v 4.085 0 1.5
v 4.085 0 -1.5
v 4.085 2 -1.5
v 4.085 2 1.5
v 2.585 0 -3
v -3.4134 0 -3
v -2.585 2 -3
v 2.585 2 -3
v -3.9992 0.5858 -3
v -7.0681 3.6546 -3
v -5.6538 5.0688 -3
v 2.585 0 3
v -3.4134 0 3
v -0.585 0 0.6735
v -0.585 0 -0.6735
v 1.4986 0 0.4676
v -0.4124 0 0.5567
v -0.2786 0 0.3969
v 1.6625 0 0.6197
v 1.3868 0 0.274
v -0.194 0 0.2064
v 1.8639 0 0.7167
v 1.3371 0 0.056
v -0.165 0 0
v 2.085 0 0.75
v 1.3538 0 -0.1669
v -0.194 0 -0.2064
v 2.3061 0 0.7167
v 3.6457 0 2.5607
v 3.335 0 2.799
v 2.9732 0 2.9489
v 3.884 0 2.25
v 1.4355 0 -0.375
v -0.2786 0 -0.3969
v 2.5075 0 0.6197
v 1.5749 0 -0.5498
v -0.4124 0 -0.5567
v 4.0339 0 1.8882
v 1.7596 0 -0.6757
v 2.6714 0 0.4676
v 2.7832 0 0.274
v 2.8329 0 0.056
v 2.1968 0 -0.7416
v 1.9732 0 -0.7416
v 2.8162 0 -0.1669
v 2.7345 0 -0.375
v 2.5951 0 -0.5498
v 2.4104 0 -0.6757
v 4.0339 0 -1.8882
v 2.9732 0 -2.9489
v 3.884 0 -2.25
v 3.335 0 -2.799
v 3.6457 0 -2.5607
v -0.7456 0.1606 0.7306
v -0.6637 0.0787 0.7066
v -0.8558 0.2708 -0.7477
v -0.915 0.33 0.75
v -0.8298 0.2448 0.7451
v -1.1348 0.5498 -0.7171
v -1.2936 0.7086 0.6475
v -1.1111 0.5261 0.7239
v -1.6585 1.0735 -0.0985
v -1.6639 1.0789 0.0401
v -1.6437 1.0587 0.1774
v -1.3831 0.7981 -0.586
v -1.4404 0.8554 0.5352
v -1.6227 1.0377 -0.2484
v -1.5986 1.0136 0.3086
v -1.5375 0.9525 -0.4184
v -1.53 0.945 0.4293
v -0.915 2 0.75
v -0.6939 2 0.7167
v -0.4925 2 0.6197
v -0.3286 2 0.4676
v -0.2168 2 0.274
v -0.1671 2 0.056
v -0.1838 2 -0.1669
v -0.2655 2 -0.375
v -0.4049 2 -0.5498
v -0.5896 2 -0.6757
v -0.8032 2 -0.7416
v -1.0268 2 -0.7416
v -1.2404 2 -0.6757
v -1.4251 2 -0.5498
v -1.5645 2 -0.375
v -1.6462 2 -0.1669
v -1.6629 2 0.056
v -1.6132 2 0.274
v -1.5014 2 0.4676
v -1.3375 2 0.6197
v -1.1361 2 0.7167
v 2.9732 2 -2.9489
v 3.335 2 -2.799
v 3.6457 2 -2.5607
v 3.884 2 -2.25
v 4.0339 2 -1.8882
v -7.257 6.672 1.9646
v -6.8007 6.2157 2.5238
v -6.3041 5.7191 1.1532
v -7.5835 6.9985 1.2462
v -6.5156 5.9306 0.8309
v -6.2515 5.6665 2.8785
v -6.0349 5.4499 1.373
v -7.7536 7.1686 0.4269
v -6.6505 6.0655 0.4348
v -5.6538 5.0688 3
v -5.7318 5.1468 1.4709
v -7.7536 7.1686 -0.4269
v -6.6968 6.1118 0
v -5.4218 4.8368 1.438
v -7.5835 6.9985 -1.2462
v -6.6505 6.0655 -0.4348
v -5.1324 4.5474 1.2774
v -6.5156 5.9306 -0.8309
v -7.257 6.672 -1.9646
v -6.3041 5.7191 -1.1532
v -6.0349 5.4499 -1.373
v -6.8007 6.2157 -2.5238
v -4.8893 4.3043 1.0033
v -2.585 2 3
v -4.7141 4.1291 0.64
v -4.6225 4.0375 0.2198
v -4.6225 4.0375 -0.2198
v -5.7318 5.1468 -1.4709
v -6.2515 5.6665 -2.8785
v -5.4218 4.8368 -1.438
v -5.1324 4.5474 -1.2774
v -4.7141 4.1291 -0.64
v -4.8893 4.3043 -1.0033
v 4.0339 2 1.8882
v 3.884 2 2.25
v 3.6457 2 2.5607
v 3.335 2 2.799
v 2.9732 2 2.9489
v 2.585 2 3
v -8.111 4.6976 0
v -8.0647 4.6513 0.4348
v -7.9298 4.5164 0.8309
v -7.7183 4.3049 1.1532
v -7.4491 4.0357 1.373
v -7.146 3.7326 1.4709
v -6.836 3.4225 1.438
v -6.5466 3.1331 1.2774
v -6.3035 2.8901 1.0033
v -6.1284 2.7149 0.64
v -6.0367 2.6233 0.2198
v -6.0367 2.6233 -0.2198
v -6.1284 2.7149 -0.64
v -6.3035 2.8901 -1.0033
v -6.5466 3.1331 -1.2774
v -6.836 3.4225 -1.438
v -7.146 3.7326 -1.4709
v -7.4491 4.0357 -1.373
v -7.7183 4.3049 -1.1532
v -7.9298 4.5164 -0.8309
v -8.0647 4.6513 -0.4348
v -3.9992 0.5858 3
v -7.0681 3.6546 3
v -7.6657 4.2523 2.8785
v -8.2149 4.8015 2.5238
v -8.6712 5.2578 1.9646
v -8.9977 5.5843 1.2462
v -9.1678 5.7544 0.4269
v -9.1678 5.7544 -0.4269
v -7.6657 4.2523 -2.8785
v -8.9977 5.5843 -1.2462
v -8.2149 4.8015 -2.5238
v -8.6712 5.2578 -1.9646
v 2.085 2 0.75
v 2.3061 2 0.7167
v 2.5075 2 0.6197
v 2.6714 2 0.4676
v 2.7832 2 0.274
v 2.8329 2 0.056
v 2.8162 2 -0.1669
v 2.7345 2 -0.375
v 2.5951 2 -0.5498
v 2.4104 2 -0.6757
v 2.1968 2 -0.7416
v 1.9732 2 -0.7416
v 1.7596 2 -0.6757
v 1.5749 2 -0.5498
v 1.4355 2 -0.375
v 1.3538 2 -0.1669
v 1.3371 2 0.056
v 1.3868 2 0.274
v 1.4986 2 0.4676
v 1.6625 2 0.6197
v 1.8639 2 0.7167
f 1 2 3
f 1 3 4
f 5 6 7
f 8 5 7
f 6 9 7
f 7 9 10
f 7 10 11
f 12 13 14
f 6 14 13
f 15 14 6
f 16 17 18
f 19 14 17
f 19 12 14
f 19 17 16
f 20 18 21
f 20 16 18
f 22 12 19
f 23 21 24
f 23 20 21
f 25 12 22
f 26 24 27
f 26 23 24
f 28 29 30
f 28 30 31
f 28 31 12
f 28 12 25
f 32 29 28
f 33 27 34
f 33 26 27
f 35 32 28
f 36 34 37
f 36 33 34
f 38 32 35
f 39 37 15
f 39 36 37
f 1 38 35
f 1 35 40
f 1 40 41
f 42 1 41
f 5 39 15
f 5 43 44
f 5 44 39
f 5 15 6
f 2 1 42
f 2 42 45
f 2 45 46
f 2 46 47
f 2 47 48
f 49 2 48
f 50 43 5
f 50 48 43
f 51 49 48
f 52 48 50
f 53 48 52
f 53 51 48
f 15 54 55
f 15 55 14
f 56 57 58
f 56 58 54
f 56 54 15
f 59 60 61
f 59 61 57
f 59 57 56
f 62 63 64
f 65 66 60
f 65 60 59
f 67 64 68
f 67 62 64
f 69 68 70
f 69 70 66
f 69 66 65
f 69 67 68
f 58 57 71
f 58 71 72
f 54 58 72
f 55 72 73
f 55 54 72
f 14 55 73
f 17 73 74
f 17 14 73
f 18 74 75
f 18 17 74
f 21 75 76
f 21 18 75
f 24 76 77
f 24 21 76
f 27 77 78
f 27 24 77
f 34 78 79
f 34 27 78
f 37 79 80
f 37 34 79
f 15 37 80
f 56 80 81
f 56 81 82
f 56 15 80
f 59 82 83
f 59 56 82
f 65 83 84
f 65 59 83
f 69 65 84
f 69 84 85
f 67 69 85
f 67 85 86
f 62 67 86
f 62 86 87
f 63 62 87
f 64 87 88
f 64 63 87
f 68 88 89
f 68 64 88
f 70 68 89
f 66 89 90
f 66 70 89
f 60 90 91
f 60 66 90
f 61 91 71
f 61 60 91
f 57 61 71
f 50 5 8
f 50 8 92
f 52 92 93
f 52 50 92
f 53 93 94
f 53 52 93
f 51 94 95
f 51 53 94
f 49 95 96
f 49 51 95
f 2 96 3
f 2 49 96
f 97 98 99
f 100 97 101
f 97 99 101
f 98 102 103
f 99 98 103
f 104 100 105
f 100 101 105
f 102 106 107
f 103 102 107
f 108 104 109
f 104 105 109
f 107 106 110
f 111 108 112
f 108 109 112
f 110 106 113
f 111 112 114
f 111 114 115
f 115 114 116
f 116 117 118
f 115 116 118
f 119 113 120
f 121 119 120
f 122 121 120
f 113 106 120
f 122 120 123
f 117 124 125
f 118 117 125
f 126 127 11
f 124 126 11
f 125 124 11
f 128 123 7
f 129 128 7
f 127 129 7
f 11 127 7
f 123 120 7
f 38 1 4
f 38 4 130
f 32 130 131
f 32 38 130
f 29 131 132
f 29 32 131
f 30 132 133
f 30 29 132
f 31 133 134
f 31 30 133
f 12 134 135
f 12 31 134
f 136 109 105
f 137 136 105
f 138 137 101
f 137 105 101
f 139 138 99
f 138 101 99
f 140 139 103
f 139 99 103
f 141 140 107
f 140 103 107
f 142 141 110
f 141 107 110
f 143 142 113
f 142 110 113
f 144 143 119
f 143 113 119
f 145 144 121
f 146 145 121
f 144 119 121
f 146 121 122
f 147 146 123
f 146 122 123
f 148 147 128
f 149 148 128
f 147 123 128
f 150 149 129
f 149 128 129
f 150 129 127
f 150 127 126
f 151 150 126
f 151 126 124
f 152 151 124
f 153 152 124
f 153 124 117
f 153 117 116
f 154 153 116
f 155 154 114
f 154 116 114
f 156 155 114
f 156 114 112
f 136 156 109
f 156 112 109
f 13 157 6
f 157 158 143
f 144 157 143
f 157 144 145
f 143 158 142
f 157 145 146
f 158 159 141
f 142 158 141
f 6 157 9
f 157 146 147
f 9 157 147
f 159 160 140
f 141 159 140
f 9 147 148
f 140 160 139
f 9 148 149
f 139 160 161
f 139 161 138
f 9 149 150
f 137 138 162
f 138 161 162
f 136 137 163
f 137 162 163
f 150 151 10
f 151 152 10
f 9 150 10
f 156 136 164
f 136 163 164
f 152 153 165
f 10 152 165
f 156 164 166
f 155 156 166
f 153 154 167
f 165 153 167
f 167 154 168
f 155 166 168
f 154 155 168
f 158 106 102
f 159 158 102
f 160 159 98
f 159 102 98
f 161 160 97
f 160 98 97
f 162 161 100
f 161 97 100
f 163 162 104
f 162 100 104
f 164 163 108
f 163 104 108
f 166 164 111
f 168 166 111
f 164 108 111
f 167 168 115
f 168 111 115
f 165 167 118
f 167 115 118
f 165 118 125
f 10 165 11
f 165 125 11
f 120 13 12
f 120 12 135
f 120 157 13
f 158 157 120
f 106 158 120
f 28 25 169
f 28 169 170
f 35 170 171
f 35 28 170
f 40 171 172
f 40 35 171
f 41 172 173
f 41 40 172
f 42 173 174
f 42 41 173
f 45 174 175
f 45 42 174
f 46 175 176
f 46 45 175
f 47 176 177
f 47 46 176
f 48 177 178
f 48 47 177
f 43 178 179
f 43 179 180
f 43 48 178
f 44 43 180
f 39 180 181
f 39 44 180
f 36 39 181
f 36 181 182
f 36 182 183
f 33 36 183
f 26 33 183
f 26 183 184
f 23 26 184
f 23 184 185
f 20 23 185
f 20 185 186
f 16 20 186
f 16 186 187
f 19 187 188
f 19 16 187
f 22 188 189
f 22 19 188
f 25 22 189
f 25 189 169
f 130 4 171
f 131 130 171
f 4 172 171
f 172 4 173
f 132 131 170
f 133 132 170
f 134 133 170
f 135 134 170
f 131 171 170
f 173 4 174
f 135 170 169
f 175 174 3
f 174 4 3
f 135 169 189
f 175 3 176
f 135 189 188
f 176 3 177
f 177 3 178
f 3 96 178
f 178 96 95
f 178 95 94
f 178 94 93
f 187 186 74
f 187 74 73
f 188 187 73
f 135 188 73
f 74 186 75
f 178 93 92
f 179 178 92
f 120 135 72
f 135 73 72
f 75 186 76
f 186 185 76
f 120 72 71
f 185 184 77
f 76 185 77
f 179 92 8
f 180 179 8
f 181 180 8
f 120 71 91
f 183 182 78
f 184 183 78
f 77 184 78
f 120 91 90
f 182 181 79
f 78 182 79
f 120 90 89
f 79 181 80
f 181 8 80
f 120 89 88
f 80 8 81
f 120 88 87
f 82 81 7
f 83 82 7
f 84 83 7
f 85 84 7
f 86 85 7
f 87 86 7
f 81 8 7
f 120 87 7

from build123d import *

# Parameters (mm, degrees)
CROQUIS2_R              = 0.75
SALIENTE_EXTRUIR1_DEPTH = 2
CROQUIS6_R              = 1.475
SALIENTE_EXTRUIR3_DEPTH = 2
SALIENTE_EXTRUIR4_REACH = 10.975
CROQUIS8_W              = 6
CROQUIS8_H              = 2


with BuildPart() as part:
    # Croquis2 → Saliente-Extruir1 (new body)
    with BuildSketch(Plane(origin=(0, 0, 0), x_dir=(1, 0, 0), z_dir=(0, 1, 0))):
        with BuildLine():
            Line((-2.585, 3), (2.585, 3))
            ThreePointArc((2.585, 3), (3.645660172, 2.560660172), (4.085, 1.5))
            Line((4.085, 1.5), (4.085, -1.5))
            ThreePointArc((4.085, -1.5), (3.645660172, -2.560660172), (2.585, -3))
            Line((2.585, -3), (-2.585, -3))
            Line((-2.585, -3), (-2.585, 3))
        make_face()
        with Locations(Location((-0.915, 0, 0), (0, 0, 270))):
            Circle(CROQUIS2_R, mode=Mode.SUBTRACT)
        with Locations(Location((2.085, 0, 0), (0, 0, 270))):
            Circle(CROQUIS2_R, mode=Mode.SUBTRACT)
    extrude(amount=SALIENTE_EXTRUIR1_DEPTH)



with BuildPart() as body_2:
    # Croquis6 → Saliente-Extruir3 (new body)
    with BuildSketch(Plane(origin=(-0.2925, -0.2925, 0), x_dir=(0, 0, 1), z_dir=(0.7071067811865438, 0.7071067811865512, 0))):
        with BuildLine():
            Line((-3, -3.242084592), (3, -3.242084592))
            Line((3, -3.242084592), (3, -7.582084592))
            ThreePointArc((3, -7.582084592), (0, -10.582084592), (-3, -7.582084592))
            Line((-3, -7.582084592), (-3, -3.242084592))
        make_face()
        with Locations(Location((0, -7.582084592, 0), (0, 0, 270))):
            Circle(CROQUIS6_R, mode=Mode.SUBTRACT)
    extrude(amount=-SALIENTE_EXTRUIR3_DEPTH)


with BuildPart() as part_1:
    add(part.part)

    add(body_2.part)  # Saliente-Extruir4 merges body 2
    # Saliente-Extruir4: up to this plane
    saliente_extruir4_end = Plane(origin=(2.585, 0, 1.5), z_dir=(0, -1, 0))
    # Croquis8 → Saliente-Extruir4 (add, up to the surface)
    with BuildSketch(Plane(origin=(-2.2925, 2.2925, 0), x_dir=(0, 0, -1), z_dir=(0.7071067811865513, -0.7071067811865438, 0)), mode=Mode.PRIVATE) as saliente_extruir4_sk1:
        with Locations((0, -1.413657467)):
            Rectangle(CROQUIS8_W, CROQUIS8_H)
    saliente_extruir4_tool1 = split(extrude(saliente_extruir4_sk1.sketch, amount=SALIENTE_EXTRUIR4_REACH, mode=Mode.PRIVATE), bisect_by=saliente_extruir4_end, keep=Keep.BOTH, mode=Mode.PRIVATE)
    add(saliente_extruir4_tool1.solids().sort_by_distance((-3.292107, 1.292893, 0))[0])


solid = part_1.part
